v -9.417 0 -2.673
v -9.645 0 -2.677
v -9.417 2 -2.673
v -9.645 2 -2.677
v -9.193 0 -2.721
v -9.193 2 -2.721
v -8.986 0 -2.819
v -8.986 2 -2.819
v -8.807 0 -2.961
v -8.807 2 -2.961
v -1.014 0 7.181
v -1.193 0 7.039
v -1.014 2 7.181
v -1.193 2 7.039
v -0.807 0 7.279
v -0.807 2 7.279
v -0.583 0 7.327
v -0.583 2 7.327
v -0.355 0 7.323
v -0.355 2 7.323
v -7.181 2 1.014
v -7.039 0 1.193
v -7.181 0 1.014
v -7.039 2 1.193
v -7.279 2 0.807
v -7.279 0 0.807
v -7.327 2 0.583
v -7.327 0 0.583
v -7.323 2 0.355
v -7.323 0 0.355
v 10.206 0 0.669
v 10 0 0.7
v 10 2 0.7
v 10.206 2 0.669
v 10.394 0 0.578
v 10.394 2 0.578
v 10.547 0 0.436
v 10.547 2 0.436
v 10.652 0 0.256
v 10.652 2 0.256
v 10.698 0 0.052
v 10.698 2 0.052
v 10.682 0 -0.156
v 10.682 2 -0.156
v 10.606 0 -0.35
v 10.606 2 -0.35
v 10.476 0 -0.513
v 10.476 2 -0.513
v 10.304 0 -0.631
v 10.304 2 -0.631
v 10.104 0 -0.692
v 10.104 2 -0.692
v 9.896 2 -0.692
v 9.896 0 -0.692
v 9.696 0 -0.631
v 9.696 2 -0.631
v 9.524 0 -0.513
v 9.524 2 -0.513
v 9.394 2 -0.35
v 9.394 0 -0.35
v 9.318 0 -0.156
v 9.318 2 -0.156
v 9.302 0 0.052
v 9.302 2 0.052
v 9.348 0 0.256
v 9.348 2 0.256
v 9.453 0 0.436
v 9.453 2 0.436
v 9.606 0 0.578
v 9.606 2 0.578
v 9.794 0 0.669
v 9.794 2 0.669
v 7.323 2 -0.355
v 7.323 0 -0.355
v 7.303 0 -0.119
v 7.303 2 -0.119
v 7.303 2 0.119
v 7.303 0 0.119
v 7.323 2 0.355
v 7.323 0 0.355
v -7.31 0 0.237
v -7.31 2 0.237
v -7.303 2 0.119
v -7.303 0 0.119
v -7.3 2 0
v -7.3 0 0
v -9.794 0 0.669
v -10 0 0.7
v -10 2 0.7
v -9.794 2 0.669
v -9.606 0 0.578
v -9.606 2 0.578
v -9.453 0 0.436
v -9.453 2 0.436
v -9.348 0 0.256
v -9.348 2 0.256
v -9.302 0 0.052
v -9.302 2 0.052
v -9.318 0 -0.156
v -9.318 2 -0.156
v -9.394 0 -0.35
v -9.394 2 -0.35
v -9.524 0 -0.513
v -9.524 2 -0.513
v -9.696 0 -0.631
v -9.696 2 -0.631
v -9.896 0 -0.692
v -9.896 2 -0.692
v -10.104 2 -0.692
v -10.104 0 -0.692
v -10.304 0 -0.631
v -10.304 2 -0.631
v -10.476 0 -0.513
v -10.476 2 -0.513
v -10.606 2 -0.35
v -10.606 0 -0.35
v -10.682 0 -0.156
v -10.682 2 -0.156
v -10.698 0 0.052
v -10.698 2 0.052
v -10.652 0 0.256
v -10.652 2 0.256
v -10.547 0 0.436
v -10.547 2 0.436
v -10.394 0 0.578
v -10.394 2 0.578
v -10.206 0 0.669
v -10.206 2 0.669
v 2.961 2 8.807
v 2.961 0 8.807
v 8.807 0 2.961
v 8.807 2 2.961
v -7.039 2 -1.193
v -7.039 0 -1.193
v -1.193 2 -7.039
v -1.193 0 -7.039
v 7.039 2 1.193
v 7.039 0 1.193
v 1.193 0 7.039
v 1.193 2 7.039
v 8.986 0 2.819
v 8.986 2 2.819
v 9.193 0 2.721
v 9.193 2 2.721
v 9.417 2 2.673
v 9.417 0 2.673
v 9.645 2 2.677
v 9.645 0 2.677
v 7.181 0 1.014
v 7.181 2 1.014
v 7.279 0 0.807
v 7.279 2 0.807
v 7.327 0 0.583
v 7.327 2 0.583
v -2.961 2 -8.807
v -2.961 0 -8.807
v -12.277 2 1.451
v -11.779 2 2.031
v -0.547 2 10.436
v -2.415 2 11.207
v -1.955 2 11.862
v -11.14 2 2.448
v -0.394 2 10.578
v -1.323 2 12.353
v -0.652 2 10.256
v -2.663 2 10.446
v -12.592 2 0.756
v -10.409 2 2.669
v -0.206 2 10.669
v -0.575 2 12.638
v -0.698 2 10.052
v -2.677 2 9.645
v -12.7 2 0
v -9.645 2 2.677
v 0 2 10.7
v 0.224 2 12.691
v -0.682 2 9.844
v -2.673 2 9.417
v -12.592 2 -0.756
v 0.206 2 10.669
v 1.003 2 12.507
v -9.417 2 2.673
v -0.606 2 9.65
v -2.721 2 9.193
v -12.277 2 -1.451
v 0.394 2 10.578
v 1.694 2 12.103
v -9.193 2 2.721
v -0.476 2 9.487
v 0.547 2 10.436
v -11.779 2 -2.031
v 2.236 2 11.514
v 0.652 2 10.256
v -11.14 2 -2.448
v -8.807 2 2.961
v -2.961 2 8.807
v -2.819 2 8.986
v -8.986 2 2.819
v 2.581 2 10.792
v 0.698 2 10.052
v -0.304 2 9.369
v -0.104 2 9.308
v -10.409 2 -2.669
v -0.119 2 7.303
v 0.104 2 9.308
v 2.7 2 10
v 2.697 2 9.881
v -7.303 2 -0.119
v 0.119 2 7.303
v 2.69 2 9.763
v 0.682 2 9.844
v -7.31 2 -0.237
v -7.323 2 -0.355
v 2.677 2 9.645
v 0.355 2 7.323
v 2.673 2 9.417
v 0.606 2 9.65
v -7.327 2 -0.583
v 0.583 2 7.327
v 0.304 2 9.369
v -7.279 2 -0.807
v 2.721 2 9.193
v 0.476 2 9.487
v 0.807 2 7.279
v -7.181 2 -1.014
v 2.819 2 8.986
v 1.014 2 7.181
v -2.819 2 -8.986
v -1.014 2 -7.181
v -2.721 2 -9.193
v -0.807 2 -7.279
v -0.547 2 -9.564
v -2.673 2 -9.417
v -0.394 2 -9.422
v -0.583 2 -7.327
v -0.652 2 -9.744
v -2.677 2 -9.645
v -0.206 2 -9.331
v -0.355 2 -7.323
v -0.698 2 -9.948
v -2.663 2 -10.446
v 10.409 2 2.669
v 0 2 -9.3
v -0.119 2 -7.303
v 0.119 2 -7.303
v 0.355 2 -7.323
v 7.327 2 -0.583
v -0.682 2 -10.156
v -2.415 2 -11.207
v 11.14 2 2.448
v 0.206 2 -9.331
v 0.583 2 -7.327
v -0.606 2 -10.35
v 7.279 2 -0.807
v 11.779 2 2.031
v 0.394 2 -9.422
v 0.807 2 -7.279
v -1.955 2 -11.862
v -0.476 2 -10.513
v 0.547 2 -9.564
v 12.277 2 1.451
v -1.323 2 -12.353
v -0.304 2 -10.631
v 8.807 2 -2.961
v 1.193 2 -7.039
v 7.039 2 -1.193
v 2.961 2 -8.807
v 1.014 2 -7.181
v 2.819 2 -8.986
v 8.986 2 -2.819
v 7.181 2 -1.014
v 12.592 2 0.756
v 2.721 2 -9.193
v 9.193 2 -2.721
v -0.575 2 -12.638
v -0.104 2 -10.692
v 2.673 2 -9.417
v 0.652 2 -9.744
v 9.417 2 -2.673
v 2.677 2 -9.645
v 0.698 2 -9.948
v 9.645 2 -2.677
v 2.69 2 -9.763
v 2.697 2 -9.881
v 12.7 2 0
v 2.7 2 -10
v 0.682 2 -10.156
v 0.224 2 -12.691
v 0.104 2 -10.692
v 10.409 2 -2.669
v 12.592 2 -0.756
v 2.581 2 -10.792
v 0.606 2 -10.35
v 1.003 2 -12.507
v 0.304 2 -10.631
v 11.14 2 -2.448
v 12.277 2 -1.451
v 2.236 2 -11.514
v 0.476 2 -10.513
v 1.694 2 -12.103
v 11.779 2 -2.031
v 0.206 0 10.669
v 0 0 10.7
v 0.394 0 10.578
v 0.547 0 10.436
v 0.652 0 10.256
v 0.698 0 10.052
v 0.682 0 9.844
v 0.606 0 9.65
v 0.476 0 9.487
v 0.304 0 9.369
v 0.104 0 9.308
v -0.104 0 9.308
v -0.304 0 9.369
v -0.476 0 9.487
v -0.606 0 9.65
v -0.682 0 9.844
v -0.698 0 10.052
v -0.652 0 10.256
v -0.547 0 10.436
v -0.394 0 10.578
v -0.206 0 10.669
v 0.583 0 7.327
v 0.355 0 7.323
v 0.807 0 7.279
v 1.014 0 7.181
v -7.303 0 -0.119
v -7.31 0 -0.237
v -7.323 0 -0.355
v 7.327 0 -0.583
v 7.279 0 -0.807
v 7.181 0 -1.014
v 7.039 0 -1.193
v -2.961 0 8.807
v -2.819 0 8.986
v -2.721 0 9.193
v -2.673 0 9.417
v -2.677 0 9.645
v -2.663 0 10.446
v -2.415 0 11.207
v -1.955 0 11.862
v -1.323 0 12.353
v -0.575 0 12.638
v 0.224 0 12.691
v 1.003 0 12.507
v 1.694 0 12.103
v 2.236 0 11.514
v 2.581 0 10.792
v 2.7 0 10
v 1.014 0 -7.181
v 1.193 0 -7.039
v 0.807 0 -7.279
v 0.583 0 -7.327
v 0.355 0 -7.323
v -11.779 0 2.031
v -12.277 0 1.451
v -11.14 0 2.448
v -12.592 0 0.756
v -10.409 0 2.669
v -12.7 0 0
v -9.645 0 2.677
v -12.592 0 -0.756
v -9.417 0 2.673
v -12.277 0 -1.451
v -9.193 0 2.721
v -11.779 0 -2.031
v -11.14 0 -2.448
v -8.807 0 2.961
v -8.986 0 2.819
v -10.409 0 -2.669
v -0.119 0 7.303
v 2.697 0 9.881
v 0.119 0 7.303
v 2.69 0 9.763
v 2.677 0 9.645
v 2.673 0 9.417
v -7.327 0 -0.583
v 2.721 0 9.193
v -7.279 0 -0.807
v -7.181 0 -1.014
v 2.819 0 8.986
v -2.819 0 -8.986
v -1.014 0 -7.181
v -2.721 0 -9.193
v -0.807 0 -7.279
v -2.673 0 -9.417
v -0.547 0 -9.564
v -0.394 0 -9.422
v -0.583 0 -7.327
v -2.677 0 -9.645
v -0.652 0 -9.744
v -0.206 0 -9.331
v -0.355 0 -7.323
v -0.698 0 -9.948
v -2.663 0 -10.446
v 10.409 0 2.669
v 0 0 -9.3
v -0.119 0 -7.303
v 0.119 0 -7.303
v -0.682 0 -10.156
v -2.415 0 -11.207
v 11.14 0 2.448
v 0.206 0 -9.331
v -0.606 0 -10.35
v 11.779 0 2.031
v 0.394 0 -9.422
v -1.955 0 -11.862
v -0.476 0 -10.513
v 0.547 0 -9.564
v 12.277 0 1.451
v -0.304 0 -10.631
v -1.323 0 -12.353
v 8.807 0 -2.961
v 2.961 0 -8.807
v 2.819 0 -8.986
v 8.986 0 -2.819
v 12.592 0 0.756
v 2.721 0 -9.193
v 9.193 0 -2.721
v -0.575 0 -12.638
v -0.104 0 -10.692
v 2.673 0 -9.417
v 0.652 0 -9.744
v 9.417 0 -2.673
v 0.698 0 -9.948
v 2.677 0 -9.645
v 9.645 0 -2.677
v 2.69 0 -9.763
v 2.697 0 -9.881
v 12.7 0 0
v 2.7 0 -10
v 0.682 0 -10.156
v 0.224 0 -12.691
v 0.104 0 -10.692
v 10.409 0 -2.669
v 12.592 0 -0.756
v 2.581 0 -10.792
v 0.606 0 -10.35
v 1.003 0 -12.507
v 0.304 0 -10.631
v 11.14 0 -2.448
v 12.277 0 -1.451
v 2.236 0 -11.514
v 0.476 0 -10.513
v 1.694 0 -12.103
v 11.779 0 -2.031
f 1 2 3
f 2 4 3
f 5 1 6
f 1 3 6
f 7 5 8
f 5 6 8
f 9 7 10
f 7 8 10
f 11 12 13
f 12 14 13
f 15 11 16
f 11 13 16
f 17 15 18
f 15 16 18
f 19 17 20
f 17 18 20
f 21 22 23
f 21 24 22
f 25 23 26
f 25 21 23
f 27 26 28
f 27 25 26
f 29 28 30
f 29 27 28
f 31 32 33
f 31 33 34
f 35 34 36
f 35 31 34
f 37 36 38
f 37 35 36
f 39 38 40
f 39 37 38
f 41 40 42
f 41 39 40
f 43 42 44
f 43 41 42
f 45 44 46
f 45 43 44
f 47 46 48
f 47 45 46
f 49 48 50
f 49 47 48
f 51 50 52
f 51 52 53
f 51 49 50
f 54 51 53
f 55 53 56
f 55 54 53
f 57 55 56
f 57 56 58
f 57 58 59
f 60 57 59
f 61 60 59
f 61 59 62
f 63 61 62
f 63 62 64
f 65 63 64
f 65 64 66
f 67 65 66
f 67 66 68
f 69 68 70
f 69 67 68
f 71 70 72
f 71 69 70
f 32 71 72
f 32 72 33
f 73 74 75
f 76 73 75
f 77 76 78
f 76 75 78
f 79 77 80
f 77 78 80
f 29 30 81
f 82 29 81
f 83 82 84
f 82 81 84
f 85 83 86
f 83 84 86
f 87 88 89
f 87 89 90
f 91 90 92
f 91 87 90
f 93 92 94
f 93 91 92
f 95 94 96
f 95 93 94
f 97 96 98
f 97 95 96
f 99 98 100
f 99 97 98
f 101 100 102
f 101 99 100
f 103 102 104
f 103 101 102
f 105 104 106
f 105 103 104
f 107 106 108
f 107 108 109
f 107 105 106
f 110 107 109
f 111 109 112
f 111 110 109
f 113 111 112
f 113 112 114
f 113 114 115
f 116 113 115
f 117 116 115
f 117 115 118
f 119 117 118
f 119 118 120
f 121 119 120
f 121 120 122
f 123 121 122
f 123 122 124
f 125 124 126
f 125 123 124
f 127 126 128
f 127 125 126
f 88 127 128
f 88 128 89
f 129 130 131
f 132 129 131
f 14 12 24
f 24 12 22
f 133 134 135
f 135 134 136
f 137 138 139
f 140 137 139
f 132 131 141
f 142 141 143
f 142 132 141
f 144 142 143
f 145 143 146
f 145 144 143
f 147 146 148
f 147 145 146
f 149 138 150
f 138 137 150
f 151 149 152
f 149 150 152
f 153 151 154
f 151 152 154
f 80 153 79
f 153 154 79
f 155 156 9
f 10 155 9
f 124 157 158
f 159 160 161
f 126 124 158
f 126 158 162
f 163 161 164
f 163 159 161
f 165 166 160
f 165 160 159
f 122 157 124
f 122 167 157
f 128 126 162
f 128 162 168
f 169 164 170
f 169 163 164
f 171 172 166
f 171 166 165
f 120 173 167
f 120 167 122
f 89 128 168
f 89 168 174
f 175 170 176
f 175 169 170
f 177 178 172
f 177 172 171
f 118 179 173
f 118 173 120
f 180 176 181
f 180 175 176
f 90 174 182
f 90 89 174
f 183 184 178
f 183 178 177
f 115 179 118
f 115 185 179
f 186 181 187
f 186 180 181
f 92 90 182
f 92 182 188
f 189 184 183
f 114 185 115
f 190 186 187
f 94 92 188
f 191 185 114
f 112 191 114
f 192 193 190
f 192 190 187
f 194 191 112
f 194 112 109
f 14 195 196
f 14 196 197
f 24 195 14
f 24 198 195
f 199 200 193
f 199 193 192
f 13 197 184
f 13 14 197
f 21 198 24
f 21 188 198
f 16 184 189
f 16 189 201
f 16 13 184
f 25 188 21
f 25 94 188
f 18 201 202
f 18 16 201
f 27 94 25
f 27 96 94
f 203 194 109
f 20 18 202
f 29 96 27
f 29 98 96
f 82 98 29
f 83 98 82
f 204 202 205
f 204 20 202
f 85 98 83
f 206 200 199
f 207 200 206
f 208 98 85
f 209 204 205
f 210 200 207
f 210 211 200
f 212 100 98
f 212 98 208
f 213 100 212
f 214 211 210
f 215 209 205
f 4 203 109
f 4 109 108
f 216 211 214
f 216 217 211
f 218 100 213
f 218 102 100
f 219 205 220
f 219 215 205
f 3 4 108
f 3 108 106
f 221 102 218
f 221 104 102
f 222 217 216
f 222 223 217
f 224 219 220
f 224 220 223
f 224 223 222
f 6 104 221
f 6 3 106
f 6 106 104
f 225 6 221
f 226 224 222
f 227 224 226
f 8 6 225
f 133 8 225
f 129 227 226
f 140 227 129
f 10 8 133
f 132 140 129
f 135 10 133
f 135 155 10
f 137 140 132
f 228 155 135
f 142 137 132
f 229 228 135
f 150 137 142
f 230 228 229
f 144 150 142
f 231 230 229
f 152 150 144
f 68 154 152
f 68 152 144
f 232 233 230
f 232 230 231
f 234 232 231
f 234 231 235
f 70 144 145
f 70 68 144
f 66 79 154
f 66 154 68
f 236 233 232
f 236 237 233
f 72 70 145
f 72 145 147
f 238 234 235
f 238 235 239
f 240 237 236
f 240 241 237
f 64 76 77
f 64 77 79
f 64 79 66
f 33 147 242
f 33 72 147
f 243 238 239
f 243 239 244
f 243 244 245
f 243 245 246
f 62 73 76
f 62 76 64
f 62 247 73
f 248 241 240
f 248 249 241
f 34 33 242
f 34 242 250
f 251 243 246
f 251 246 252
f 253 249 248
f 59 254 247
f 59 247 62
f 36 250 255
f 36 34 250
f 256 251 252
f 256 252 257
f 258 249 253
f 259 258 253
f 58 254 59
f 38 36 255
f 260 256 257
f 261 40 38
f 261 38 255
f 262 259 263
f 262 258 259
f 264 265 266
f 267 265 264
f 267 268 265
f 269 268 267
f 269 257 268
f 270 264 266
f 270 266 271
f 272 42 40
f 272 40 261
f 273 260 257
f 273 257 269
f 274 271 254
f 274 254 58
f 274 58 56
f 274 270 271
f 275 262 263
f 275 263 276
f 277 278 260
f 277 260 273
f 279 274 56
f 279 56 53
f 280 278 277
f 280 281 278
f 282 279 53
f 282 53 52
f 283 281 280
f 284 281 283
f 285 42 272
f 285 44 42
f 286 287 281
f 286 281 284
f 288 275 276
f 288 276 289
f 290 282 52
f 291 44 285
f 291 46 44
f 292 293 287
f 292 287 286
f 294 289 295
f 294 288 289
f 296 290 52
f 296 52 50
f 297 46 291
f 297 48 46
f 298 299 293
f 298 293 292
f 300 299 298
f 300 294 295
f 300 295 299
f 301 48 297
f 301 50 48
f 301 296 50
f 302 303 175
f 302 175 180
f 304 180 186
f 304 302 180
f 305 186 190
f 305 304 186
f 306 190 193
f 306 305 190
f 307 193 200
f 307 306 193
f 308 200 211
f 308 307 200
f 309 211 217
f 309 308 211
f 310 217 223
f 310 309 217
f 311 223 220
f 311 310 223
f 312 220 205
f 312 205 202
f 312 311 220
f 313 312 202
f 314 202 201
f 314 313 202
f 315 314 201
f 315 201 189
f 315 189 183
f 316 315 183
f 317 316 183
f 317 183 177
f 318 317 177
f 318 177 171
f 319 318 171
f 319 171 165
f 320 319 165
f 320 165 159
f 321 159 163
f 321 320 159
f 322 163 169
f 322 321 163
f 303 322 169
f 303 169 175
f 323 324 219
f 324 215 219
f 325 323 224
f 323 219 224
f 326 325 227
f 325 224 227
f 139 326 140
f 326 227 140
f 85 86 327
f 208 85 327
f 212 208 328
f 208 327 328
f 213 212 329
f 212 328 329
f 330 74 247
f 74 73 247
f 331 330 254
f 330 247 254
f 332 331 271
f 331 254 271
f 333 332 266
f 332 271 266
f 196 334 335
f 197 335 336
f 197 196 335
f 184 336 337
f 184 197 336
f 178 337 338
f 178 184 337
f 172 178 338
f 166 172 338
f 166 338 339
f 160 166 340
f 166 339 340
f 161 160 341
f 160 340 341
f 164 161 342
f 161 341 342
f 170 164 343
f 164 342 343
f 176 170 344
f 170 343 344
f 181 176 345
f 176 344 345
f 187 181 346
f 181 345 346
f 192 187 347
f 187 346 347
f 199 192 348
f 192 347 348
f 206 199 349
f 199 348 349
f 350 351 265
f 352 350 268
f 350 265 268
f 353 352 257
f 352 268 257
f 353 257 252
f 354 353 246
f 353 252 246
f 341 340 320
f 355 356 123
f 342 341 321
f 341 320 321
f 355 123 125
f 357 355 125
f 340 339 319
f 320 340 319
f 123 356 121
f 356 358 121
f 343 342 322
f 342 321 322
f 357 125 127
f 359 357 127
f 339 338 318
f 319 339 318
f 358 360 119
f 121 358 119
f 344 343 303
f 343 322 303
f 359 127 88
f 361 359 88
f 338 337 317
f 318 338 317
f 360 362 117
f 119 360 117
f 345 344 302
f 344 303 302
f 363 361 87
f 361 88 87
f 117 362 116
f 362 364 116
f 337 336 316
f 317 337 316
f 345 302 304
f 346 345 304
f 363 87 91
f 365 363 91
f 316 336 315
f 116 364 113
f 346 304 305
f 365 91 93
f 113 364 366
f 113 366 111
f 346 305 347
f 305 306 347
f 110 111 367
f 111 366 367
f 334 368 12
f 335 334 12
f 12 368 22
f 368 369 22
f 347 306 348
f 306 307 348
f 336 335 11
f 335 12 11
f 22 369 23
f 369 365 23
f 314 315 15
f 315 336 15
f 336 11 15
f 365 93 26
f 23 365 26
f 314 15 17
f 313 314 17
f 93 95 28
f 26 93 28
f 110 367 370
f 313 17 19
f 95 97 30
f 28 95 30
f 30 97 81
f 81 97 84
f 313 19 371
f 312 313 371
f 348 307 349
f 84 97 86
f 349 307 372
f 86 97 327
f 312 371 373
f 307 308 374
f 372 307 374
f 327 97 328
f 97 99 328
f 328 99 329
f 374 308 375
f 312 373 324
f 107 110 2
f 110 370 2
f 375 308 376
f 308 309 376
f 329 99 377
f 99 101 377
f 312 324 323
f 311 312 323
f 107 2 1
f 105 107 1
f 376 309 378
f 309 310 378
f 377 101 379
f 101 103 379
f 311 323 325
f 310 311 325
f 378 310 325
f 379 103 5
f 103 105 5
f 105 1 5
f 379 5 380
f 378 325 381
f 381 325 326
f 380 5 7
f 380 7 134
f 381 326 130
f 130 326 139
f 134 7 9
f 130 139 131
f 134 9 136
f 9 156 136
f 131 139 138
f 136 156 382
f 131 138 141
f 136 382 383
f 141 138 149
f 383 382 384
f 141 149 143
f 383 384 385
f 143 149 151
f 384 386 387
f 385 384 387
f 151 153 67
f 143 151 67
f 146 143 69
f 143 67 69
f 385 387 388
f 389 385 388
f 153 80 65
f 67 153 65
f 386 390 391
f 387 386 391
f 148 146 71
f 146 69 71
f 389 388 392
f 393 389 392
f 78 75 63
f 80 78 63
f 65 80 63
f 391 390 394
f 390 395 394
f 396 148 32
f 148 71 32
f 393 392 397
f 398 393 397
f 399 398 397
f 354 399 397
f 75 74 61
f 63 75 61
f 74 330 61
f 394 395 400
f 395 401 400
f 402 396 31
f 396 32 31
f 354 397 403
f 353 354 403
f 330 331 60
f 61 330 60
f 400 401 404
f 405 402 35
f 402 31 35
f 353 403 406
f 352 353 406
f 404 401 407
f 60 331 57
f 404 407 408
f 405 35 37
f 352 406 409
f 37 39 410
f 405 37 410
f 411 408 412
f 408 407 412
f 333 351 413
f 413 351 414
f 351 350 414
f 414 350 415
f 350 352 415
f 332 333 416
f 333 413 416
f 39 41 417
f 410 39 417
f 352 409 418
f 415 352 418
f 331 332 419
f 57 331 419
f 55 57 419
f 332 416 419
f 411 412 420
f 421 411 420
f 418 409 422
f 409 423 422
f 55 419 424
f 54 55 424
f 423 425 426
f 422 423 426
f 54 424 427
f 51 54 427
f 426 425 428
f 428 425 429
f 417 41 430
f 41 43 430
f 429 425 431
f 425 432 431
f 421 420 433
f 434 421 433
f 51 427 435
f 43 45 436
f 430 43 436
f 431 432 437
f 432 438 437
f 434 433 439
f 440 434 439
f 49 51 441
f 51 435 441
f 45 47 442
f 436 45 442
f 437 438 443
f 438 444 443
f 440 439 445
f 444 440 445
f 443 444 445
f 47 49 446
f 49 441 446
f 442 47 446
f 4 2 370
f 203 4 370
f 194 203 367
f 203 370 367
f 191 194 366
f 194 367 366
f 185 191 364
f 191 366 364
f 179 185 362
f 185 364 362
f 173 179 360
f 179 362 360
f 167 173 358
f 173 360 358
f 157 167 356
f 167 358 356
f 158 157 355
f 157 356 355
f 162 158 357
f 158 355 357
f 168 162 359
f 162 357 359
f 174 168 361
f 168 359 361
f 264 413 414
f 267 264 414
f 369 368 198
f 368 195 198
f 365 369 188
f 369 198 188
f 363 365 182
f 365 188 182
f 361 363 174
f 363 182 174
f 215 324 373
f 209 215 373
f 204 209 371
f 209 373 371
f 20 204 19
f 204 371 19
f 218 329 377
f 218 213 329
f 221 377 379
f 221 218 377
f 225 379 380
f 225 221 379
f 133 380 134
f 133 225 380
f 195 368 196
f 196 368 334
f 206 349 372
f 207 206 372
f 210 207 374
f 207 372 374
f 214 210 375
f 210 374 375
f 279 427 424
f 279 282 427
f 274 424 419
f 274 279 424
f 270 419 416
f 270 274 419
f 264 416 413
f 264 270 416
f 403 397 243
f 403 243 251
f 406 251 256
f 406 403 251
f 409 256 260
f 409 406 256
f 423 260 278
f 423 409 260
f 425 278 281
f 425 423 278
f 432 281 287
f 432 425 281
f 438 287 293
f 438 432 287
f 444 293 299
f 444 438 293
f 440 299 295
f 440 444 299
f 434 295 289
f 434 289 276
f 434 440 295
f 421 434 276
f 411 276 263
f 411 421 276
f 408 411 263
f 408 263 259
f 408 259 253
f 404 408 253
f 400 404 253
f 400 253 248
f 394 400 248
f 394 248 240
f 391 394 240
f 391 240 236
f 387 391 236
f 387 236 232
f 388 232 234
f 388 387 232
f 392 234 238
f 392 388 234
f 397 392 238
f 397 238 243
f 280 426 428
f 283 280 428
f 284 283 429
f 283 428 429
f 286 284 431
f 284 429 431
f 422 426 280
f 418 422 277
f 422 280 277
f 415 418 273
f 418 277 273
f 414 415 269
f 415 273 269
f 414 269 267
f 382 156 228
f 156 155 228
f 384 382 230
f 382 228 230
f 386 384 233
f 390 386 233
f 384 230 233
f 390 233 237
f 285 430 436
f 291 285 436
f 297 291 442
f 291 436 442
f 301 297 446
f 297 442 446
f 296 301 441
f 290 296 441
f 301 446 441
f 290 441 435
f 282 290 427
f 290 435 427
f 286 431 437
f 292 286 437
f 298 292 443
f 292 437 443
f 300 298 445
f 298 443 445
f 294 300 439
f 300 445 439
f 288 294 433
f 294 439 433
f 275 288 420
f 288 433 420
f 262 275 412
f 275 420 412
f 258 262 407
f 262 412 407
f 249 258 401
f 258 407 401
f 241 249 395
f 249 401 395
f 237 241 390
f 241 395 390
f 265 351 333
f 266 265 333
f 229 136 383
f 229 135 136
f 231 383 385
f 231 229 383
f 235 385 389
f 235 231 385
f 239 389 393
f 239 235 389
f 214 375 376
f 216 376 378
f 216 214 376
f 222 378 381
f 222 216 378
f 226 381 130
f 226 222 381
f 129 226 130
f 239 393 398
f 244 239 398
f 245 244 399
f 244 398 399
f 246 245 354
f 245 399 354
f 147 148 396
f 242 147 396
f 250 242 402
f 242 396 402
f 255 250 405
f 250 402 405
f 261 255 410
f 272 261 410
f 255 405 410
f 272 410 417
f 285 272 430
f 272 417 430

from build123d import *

# Parameters (mm, degrees)
SKETCH2_R           = 0.7
BOSS_EXTRUDE1_DEPTH = 2
FILLET1_R           = 1


with BuildPart() as part:
    # Sketch2 → Boss-Extrude1 (new body)
    # profile 1 of 16: a face of its own
    with BuildSketch(Plane(origin=(0, 0, 0), x_dir=(1, 0, 0), z_dir=(0, 1, 0))):
        with BuildLine():
            Line((-7.423854723, 0.808378324), (-9.191621676, 2.576145277))
            ThreePointArc((-9.191621676, 2.576145277), (-12.7, 0), (-9.191621676, -2.576145277))
            Line((-9.191621676, -2.576145277), (-7.423854723, -0.808378324))
            ThreePointArc((-7.423854723, -0.808378324), (-7.331143293, -0.408905706), (-7.3, 0))
            ThreePointArc((-7.3, 0), (-7.331143293, 0.408905706), (-7.423854723, 0.808378324))
        make_face()
        with Locations(Location((-10, 0, 0), (0, 0, 270))):
            Circle(SKETCH2_R, mode=Mode.SUBTRACT)
    # profile 2 of 16: a face of its own
    with BuildSketch(Plane(origin=(0, 0, 0), x_dir=(1, 0, 0), z_dir=(0, 1, 0))):
        with BuildLine():
            ThreePointArc((-0.808378324, 7.423854723), (-1.909188309, 8.090811691), (-2.576145277, 9.191621676))
            Line((-2.576145277, 9.191621676), (-9.191621676, 2.576145277))
            ThreePointArc((-9.191621676, 2.576145277), (-8.090811691, 1.909188309), (-7.423854723, 0.808378324))
            Line((-7.423854723, 0.808378324), (-0.808378324, 7.423854723))
        make_face()
    # profile 3 of 16: a face of its own
    with BuildSketch(Plane(origin=(0, 0, 0), x_dir=(1, 0, 0), z_dir=(0, 1, 0))):
        with BuildLine():
            ThreePointArc((2.7, 10), (-0.408905706, 12.668856707), (-2.576145277, 9.191621676))
            Line((-2.576145277, 9.191621676), (-0.808378324, 7.423854723))
            ThreePointArc((-0.808378324, 7.423854723), (0, 7.3), (0.808378324, 7.423854723))
            Line((0.808378324, 7.423854723), (2.576145277, 9.191621676))
            ThreePointArc((2.576145277, 9.191621676), (2.668856707, 9.591094294), (2.7, 10))
        make_face()
        with Locations(Location((0, 10, 0), (0, 0, 270))):
            Circle(SKETCH2_R, mode=Mode.SUBTRACT)
    # profile 4 of 16: a face of its own
    with BuildSketch(Plane(origin=(0, 0, 0), x_dir=(1, 0, 0), z_dir=(0, 1, 0))):
        with BuildLine():
            ThreePointArc((2.576145277, 9.191621676), (1.909188309, 8.090811691), (0.808378324, 7.423854723))
            Line((0.808378324, 7.423854723), (7.423854723, 0.808378324))
            ThreePointArc((7.423854723, 0.808378324), (8.090811691, 1.909188309), (9.191621676, 2.576145277))
            Line((9.191621676, 2.576145277), (2.576145277, 9.191621676))
        make_face()
    # profile 5 of 16: a face of its own
    with BuildSketch(Plane(origin=(0, 0, 0), x_dir=(1, 0, 0), z_dir=(0, 1, 0))):
        with BuildLine():
            Line((9.191621676, 2.576145277), (7.423854723, 0.808378324))
            ThreePointArc((7.423854723, 0.808378324), (7.3, 0), (7.423854723, -0.808378324))
            Line((7.423854723, -0.808378324), (9.191621676, -2.576145277))
            ThreePointArc((9.191621676, -2.576145277), (11.598026678, -2.176306673), (12.7, 0))
            ThreePointArc((12.7, 0), (11.598026678, 2.176306673), (9.191621676, 2.576145277))
        make_face()
        with Locations(Location((10, 0, 0), (0, 0, 270))):
            Circle(SKETCH2_R, mode=Mode.SUBTRACT)
    # profile 6 of 16: a face of its own
    with BuildSketch(Plane(origin=(0, 0, 0), x_dir=(1, 0, 0), z_dir=(0, 1, 0))):
        with BuildLine():
            ThreePointArc((9.191621676, -2.576145277), (8.090811691, -1.909188309), (7.423854723, -0.808378324))
            Line((7.423854723, -0.808378324), (0.808378324, -7.423854723))
            ThreePointArc((0.808378324, -7.423854723), (1.909188309, -8.090811691), (2.576145277, -9.191621676))
            Line((2.576145277, -9.191621676), (9.191621676, -2.576145277))
        make_face()
    # profile 7 of 16: a face of its own
    with BuildSketch(Plane(origin=(0, 0, 0), x_dir=(1, 0, 0), z_dir=(0, 1, 0))):
        with BuildLine():
            Line((-0.808378324, -7.423854723), (-2.576145277, -9.191621676))
            ThreePointArc((-2.576145277, -9.191621676), (-0.408905706, -12.668856707), (2.7, -10))
            ThreePointArc((2.7, -10), (2.668856707, -9.591094294), (2.576145277, -9.191621676))
            Line((2.576145277, -9.191621676), (0.808378324, -7.423854723))
            ThreePointArc((0.808378324, -7.423854723), (0, -7.3), (-0.808378324, -7.423854723))
        make_face()
        with Locations(Location((0, -10, 0), (0, 0, 270))):
            Circle(SKETCH2_R, mode=Mode.SUBTRACT)
    # profile 8 of 16: a face of its own
    with BuildSketch(Plane(origin=(0, 0, 0), x_dir=(1, 0, 0), z_dir=(0, 1, 0))):
        with BuildLine():
            ThreePointArc((-7.423854723, -0.808378324), (-8.090811691, -1.909188309), (-9.191621676, -2.576145277))
            Line((-9.191621676, -2.576145277), (-2.576145277, -9.191621676))
            ThreePointArc((-2.576145277, -9.191621676), (-1.909188309, -8.090811691), (-0.808378324, -7.423854723))
            Line((-0.808378324, -7.423854723), (-7.423854723, -0.808378324))
        make_face()
    # profile 9 of 16: a face of its own
    with BuildSketch(Plane(origin=(0, 0, 0), x_dir=(1, 0, 0), z_dir=(0, 1, 0))):
        with BuildLine():
            Line((-7.423854723, -0.808378324), (-9.191621676, -2.576145277))
            ThreePointArc((-9.191621676, -2.576145277), (-8.090811691, -1.909188309), (-7.423854723, -0.808378324))
        make_face()
    # profile 10 of 16: a face of its own
    with BuildSketch(Plane(origin=(0, 0, 0), x_dir=(1, 0, 0), z_dir=(0, 1, 0))):
        with BuildLine():
            ThreePointArc((-7.423854723, 0.808378324), (-8.090811691, 1.909188309), (-9.191621676, 2.576145277))
            Line((-9.191621676, 2.576145277), (-7.423854723, 0.808378324))
        make_face()
    # profile 11 of 16: a face of its own
    with BuildSketch(Plane(origin=(0, 0, 0), x_dir=(1, 0, 0), z_dir=(0, 1, 0))):
        with BuildLine():
            Line((-0.808378324, 7.423854723), (-2.576145277, 9.191621676))
            ThreePointArc((-2.576145277, 9.191621676), (-1.909188309, 8.090811691), (-0.808378324, 7.423854723))
        make_face()
    # profile 12 of 16: a face of its own
    with BuildSketch(Plane(origin=(0, 0, 0), x_dir=(1, 0, 0), z_dir=(0, 1, 0))):
        with BuildLine():
            Line((2.576145277, 9.191621676), (0.808378324, 7.423854723))
            ThreePointArc((0.808378324, 7.423854723), (1.909188309, 8.090811691), (2.576145277, 9.191621676))
        make_face()
    # profile 13 of 16: a face of its own
    with BuildSketch(Plane(origin=(0, 0, 0), x_dir=(1, 0, 0), z_dir=(0, 1, 0))):
        with BuildLine():
            ThreePointArc((9.191621676, 2.576145277), (8.090811691, 1.909188309), (7.423854723, 0.808378324))
            Line((7.423854723, 0.808378324), (9.191621676, 2.576145277))
        make_face()
    # profile 14 of 16: a face of its own
    with BuildSketch(Plane(origin=(0, 0, 0), x_dir=(1, 0, 0), z_dir=(0, 1, 0))):
        with BuildLine():
            Line((9.191621676, -2.576145277), (7.423854723, -0.808378324))
            ThreePointArc((7.423854723, -0.808378324), (8.090811691, -1.909188309), (9.191621676, -2.576145277))
        make_face()
    # profile 15 of 16: a face of its own
    with BuildSketch(Plane(origin=(0, 0, 0), x_dir=(1, 0, 0), z_dir=(0, 1, 0))):
        with BuildLine():
            ThreePointArc((2.576145277, -9.191621676), (1.909188309, -8.090811691), (0.808378324, -7.423854723))
            Line((0.808378324, -7.423854723), (2.576145277, -9.191621676))
        make_face()
    # profile 16 of 16: a face of its own
    with BuildSketch(Plane(origin=(0, 0, 0), x_dir=(1, 0, 0), z_dir=(0, 1, 0))):
        with BuildLine():
            ThreePointArc((-0.808378324, -7.423854723), (-1.909188309, -8.090811691), (-2.576145277, -9.191621676))
            Line((-2.576145277, -9.191621676), (-0.808378324, -7.423854723))
        make_face()
    extrude(amount=BOSS_EXTRUDE1_DEPTH)

    # Fillet1
    fillet1_edges = [part.edges().sort_by_distance(p)[0] for p in [
        (-2.576145277, 1, 9.191621676),
        (-9.191621676, 1, 2.576145277),
        (-9.191621676, 1, -2.576145277),
        (-2.576145277, 1, -9.191621676),
        (2.576145277, 1, -9.191621676),
        (9.191621676, 1, -2.576145277),
        (9.191621676, 1, 2.576145277),
        (2.576145277, 1, 9.191621676),
        (-0.808378324, 1, -7.423854723),
        (-7.423854723, 1, -0.808378324),
        (-7.423854723, 1, 0.808378324),
        (-0.808378324, 1, 7.423854723),
        (0.808378324, 1, 7.423854723),
        (7.423854723, 1, 0.808378324),
        (7.423854723, 1, -0.808378324),
        (0.808378324, 1, -7.423854723),
    ]]
    fillet(fillet1_edges, radius=FILLET1_R)


solid = part.part
